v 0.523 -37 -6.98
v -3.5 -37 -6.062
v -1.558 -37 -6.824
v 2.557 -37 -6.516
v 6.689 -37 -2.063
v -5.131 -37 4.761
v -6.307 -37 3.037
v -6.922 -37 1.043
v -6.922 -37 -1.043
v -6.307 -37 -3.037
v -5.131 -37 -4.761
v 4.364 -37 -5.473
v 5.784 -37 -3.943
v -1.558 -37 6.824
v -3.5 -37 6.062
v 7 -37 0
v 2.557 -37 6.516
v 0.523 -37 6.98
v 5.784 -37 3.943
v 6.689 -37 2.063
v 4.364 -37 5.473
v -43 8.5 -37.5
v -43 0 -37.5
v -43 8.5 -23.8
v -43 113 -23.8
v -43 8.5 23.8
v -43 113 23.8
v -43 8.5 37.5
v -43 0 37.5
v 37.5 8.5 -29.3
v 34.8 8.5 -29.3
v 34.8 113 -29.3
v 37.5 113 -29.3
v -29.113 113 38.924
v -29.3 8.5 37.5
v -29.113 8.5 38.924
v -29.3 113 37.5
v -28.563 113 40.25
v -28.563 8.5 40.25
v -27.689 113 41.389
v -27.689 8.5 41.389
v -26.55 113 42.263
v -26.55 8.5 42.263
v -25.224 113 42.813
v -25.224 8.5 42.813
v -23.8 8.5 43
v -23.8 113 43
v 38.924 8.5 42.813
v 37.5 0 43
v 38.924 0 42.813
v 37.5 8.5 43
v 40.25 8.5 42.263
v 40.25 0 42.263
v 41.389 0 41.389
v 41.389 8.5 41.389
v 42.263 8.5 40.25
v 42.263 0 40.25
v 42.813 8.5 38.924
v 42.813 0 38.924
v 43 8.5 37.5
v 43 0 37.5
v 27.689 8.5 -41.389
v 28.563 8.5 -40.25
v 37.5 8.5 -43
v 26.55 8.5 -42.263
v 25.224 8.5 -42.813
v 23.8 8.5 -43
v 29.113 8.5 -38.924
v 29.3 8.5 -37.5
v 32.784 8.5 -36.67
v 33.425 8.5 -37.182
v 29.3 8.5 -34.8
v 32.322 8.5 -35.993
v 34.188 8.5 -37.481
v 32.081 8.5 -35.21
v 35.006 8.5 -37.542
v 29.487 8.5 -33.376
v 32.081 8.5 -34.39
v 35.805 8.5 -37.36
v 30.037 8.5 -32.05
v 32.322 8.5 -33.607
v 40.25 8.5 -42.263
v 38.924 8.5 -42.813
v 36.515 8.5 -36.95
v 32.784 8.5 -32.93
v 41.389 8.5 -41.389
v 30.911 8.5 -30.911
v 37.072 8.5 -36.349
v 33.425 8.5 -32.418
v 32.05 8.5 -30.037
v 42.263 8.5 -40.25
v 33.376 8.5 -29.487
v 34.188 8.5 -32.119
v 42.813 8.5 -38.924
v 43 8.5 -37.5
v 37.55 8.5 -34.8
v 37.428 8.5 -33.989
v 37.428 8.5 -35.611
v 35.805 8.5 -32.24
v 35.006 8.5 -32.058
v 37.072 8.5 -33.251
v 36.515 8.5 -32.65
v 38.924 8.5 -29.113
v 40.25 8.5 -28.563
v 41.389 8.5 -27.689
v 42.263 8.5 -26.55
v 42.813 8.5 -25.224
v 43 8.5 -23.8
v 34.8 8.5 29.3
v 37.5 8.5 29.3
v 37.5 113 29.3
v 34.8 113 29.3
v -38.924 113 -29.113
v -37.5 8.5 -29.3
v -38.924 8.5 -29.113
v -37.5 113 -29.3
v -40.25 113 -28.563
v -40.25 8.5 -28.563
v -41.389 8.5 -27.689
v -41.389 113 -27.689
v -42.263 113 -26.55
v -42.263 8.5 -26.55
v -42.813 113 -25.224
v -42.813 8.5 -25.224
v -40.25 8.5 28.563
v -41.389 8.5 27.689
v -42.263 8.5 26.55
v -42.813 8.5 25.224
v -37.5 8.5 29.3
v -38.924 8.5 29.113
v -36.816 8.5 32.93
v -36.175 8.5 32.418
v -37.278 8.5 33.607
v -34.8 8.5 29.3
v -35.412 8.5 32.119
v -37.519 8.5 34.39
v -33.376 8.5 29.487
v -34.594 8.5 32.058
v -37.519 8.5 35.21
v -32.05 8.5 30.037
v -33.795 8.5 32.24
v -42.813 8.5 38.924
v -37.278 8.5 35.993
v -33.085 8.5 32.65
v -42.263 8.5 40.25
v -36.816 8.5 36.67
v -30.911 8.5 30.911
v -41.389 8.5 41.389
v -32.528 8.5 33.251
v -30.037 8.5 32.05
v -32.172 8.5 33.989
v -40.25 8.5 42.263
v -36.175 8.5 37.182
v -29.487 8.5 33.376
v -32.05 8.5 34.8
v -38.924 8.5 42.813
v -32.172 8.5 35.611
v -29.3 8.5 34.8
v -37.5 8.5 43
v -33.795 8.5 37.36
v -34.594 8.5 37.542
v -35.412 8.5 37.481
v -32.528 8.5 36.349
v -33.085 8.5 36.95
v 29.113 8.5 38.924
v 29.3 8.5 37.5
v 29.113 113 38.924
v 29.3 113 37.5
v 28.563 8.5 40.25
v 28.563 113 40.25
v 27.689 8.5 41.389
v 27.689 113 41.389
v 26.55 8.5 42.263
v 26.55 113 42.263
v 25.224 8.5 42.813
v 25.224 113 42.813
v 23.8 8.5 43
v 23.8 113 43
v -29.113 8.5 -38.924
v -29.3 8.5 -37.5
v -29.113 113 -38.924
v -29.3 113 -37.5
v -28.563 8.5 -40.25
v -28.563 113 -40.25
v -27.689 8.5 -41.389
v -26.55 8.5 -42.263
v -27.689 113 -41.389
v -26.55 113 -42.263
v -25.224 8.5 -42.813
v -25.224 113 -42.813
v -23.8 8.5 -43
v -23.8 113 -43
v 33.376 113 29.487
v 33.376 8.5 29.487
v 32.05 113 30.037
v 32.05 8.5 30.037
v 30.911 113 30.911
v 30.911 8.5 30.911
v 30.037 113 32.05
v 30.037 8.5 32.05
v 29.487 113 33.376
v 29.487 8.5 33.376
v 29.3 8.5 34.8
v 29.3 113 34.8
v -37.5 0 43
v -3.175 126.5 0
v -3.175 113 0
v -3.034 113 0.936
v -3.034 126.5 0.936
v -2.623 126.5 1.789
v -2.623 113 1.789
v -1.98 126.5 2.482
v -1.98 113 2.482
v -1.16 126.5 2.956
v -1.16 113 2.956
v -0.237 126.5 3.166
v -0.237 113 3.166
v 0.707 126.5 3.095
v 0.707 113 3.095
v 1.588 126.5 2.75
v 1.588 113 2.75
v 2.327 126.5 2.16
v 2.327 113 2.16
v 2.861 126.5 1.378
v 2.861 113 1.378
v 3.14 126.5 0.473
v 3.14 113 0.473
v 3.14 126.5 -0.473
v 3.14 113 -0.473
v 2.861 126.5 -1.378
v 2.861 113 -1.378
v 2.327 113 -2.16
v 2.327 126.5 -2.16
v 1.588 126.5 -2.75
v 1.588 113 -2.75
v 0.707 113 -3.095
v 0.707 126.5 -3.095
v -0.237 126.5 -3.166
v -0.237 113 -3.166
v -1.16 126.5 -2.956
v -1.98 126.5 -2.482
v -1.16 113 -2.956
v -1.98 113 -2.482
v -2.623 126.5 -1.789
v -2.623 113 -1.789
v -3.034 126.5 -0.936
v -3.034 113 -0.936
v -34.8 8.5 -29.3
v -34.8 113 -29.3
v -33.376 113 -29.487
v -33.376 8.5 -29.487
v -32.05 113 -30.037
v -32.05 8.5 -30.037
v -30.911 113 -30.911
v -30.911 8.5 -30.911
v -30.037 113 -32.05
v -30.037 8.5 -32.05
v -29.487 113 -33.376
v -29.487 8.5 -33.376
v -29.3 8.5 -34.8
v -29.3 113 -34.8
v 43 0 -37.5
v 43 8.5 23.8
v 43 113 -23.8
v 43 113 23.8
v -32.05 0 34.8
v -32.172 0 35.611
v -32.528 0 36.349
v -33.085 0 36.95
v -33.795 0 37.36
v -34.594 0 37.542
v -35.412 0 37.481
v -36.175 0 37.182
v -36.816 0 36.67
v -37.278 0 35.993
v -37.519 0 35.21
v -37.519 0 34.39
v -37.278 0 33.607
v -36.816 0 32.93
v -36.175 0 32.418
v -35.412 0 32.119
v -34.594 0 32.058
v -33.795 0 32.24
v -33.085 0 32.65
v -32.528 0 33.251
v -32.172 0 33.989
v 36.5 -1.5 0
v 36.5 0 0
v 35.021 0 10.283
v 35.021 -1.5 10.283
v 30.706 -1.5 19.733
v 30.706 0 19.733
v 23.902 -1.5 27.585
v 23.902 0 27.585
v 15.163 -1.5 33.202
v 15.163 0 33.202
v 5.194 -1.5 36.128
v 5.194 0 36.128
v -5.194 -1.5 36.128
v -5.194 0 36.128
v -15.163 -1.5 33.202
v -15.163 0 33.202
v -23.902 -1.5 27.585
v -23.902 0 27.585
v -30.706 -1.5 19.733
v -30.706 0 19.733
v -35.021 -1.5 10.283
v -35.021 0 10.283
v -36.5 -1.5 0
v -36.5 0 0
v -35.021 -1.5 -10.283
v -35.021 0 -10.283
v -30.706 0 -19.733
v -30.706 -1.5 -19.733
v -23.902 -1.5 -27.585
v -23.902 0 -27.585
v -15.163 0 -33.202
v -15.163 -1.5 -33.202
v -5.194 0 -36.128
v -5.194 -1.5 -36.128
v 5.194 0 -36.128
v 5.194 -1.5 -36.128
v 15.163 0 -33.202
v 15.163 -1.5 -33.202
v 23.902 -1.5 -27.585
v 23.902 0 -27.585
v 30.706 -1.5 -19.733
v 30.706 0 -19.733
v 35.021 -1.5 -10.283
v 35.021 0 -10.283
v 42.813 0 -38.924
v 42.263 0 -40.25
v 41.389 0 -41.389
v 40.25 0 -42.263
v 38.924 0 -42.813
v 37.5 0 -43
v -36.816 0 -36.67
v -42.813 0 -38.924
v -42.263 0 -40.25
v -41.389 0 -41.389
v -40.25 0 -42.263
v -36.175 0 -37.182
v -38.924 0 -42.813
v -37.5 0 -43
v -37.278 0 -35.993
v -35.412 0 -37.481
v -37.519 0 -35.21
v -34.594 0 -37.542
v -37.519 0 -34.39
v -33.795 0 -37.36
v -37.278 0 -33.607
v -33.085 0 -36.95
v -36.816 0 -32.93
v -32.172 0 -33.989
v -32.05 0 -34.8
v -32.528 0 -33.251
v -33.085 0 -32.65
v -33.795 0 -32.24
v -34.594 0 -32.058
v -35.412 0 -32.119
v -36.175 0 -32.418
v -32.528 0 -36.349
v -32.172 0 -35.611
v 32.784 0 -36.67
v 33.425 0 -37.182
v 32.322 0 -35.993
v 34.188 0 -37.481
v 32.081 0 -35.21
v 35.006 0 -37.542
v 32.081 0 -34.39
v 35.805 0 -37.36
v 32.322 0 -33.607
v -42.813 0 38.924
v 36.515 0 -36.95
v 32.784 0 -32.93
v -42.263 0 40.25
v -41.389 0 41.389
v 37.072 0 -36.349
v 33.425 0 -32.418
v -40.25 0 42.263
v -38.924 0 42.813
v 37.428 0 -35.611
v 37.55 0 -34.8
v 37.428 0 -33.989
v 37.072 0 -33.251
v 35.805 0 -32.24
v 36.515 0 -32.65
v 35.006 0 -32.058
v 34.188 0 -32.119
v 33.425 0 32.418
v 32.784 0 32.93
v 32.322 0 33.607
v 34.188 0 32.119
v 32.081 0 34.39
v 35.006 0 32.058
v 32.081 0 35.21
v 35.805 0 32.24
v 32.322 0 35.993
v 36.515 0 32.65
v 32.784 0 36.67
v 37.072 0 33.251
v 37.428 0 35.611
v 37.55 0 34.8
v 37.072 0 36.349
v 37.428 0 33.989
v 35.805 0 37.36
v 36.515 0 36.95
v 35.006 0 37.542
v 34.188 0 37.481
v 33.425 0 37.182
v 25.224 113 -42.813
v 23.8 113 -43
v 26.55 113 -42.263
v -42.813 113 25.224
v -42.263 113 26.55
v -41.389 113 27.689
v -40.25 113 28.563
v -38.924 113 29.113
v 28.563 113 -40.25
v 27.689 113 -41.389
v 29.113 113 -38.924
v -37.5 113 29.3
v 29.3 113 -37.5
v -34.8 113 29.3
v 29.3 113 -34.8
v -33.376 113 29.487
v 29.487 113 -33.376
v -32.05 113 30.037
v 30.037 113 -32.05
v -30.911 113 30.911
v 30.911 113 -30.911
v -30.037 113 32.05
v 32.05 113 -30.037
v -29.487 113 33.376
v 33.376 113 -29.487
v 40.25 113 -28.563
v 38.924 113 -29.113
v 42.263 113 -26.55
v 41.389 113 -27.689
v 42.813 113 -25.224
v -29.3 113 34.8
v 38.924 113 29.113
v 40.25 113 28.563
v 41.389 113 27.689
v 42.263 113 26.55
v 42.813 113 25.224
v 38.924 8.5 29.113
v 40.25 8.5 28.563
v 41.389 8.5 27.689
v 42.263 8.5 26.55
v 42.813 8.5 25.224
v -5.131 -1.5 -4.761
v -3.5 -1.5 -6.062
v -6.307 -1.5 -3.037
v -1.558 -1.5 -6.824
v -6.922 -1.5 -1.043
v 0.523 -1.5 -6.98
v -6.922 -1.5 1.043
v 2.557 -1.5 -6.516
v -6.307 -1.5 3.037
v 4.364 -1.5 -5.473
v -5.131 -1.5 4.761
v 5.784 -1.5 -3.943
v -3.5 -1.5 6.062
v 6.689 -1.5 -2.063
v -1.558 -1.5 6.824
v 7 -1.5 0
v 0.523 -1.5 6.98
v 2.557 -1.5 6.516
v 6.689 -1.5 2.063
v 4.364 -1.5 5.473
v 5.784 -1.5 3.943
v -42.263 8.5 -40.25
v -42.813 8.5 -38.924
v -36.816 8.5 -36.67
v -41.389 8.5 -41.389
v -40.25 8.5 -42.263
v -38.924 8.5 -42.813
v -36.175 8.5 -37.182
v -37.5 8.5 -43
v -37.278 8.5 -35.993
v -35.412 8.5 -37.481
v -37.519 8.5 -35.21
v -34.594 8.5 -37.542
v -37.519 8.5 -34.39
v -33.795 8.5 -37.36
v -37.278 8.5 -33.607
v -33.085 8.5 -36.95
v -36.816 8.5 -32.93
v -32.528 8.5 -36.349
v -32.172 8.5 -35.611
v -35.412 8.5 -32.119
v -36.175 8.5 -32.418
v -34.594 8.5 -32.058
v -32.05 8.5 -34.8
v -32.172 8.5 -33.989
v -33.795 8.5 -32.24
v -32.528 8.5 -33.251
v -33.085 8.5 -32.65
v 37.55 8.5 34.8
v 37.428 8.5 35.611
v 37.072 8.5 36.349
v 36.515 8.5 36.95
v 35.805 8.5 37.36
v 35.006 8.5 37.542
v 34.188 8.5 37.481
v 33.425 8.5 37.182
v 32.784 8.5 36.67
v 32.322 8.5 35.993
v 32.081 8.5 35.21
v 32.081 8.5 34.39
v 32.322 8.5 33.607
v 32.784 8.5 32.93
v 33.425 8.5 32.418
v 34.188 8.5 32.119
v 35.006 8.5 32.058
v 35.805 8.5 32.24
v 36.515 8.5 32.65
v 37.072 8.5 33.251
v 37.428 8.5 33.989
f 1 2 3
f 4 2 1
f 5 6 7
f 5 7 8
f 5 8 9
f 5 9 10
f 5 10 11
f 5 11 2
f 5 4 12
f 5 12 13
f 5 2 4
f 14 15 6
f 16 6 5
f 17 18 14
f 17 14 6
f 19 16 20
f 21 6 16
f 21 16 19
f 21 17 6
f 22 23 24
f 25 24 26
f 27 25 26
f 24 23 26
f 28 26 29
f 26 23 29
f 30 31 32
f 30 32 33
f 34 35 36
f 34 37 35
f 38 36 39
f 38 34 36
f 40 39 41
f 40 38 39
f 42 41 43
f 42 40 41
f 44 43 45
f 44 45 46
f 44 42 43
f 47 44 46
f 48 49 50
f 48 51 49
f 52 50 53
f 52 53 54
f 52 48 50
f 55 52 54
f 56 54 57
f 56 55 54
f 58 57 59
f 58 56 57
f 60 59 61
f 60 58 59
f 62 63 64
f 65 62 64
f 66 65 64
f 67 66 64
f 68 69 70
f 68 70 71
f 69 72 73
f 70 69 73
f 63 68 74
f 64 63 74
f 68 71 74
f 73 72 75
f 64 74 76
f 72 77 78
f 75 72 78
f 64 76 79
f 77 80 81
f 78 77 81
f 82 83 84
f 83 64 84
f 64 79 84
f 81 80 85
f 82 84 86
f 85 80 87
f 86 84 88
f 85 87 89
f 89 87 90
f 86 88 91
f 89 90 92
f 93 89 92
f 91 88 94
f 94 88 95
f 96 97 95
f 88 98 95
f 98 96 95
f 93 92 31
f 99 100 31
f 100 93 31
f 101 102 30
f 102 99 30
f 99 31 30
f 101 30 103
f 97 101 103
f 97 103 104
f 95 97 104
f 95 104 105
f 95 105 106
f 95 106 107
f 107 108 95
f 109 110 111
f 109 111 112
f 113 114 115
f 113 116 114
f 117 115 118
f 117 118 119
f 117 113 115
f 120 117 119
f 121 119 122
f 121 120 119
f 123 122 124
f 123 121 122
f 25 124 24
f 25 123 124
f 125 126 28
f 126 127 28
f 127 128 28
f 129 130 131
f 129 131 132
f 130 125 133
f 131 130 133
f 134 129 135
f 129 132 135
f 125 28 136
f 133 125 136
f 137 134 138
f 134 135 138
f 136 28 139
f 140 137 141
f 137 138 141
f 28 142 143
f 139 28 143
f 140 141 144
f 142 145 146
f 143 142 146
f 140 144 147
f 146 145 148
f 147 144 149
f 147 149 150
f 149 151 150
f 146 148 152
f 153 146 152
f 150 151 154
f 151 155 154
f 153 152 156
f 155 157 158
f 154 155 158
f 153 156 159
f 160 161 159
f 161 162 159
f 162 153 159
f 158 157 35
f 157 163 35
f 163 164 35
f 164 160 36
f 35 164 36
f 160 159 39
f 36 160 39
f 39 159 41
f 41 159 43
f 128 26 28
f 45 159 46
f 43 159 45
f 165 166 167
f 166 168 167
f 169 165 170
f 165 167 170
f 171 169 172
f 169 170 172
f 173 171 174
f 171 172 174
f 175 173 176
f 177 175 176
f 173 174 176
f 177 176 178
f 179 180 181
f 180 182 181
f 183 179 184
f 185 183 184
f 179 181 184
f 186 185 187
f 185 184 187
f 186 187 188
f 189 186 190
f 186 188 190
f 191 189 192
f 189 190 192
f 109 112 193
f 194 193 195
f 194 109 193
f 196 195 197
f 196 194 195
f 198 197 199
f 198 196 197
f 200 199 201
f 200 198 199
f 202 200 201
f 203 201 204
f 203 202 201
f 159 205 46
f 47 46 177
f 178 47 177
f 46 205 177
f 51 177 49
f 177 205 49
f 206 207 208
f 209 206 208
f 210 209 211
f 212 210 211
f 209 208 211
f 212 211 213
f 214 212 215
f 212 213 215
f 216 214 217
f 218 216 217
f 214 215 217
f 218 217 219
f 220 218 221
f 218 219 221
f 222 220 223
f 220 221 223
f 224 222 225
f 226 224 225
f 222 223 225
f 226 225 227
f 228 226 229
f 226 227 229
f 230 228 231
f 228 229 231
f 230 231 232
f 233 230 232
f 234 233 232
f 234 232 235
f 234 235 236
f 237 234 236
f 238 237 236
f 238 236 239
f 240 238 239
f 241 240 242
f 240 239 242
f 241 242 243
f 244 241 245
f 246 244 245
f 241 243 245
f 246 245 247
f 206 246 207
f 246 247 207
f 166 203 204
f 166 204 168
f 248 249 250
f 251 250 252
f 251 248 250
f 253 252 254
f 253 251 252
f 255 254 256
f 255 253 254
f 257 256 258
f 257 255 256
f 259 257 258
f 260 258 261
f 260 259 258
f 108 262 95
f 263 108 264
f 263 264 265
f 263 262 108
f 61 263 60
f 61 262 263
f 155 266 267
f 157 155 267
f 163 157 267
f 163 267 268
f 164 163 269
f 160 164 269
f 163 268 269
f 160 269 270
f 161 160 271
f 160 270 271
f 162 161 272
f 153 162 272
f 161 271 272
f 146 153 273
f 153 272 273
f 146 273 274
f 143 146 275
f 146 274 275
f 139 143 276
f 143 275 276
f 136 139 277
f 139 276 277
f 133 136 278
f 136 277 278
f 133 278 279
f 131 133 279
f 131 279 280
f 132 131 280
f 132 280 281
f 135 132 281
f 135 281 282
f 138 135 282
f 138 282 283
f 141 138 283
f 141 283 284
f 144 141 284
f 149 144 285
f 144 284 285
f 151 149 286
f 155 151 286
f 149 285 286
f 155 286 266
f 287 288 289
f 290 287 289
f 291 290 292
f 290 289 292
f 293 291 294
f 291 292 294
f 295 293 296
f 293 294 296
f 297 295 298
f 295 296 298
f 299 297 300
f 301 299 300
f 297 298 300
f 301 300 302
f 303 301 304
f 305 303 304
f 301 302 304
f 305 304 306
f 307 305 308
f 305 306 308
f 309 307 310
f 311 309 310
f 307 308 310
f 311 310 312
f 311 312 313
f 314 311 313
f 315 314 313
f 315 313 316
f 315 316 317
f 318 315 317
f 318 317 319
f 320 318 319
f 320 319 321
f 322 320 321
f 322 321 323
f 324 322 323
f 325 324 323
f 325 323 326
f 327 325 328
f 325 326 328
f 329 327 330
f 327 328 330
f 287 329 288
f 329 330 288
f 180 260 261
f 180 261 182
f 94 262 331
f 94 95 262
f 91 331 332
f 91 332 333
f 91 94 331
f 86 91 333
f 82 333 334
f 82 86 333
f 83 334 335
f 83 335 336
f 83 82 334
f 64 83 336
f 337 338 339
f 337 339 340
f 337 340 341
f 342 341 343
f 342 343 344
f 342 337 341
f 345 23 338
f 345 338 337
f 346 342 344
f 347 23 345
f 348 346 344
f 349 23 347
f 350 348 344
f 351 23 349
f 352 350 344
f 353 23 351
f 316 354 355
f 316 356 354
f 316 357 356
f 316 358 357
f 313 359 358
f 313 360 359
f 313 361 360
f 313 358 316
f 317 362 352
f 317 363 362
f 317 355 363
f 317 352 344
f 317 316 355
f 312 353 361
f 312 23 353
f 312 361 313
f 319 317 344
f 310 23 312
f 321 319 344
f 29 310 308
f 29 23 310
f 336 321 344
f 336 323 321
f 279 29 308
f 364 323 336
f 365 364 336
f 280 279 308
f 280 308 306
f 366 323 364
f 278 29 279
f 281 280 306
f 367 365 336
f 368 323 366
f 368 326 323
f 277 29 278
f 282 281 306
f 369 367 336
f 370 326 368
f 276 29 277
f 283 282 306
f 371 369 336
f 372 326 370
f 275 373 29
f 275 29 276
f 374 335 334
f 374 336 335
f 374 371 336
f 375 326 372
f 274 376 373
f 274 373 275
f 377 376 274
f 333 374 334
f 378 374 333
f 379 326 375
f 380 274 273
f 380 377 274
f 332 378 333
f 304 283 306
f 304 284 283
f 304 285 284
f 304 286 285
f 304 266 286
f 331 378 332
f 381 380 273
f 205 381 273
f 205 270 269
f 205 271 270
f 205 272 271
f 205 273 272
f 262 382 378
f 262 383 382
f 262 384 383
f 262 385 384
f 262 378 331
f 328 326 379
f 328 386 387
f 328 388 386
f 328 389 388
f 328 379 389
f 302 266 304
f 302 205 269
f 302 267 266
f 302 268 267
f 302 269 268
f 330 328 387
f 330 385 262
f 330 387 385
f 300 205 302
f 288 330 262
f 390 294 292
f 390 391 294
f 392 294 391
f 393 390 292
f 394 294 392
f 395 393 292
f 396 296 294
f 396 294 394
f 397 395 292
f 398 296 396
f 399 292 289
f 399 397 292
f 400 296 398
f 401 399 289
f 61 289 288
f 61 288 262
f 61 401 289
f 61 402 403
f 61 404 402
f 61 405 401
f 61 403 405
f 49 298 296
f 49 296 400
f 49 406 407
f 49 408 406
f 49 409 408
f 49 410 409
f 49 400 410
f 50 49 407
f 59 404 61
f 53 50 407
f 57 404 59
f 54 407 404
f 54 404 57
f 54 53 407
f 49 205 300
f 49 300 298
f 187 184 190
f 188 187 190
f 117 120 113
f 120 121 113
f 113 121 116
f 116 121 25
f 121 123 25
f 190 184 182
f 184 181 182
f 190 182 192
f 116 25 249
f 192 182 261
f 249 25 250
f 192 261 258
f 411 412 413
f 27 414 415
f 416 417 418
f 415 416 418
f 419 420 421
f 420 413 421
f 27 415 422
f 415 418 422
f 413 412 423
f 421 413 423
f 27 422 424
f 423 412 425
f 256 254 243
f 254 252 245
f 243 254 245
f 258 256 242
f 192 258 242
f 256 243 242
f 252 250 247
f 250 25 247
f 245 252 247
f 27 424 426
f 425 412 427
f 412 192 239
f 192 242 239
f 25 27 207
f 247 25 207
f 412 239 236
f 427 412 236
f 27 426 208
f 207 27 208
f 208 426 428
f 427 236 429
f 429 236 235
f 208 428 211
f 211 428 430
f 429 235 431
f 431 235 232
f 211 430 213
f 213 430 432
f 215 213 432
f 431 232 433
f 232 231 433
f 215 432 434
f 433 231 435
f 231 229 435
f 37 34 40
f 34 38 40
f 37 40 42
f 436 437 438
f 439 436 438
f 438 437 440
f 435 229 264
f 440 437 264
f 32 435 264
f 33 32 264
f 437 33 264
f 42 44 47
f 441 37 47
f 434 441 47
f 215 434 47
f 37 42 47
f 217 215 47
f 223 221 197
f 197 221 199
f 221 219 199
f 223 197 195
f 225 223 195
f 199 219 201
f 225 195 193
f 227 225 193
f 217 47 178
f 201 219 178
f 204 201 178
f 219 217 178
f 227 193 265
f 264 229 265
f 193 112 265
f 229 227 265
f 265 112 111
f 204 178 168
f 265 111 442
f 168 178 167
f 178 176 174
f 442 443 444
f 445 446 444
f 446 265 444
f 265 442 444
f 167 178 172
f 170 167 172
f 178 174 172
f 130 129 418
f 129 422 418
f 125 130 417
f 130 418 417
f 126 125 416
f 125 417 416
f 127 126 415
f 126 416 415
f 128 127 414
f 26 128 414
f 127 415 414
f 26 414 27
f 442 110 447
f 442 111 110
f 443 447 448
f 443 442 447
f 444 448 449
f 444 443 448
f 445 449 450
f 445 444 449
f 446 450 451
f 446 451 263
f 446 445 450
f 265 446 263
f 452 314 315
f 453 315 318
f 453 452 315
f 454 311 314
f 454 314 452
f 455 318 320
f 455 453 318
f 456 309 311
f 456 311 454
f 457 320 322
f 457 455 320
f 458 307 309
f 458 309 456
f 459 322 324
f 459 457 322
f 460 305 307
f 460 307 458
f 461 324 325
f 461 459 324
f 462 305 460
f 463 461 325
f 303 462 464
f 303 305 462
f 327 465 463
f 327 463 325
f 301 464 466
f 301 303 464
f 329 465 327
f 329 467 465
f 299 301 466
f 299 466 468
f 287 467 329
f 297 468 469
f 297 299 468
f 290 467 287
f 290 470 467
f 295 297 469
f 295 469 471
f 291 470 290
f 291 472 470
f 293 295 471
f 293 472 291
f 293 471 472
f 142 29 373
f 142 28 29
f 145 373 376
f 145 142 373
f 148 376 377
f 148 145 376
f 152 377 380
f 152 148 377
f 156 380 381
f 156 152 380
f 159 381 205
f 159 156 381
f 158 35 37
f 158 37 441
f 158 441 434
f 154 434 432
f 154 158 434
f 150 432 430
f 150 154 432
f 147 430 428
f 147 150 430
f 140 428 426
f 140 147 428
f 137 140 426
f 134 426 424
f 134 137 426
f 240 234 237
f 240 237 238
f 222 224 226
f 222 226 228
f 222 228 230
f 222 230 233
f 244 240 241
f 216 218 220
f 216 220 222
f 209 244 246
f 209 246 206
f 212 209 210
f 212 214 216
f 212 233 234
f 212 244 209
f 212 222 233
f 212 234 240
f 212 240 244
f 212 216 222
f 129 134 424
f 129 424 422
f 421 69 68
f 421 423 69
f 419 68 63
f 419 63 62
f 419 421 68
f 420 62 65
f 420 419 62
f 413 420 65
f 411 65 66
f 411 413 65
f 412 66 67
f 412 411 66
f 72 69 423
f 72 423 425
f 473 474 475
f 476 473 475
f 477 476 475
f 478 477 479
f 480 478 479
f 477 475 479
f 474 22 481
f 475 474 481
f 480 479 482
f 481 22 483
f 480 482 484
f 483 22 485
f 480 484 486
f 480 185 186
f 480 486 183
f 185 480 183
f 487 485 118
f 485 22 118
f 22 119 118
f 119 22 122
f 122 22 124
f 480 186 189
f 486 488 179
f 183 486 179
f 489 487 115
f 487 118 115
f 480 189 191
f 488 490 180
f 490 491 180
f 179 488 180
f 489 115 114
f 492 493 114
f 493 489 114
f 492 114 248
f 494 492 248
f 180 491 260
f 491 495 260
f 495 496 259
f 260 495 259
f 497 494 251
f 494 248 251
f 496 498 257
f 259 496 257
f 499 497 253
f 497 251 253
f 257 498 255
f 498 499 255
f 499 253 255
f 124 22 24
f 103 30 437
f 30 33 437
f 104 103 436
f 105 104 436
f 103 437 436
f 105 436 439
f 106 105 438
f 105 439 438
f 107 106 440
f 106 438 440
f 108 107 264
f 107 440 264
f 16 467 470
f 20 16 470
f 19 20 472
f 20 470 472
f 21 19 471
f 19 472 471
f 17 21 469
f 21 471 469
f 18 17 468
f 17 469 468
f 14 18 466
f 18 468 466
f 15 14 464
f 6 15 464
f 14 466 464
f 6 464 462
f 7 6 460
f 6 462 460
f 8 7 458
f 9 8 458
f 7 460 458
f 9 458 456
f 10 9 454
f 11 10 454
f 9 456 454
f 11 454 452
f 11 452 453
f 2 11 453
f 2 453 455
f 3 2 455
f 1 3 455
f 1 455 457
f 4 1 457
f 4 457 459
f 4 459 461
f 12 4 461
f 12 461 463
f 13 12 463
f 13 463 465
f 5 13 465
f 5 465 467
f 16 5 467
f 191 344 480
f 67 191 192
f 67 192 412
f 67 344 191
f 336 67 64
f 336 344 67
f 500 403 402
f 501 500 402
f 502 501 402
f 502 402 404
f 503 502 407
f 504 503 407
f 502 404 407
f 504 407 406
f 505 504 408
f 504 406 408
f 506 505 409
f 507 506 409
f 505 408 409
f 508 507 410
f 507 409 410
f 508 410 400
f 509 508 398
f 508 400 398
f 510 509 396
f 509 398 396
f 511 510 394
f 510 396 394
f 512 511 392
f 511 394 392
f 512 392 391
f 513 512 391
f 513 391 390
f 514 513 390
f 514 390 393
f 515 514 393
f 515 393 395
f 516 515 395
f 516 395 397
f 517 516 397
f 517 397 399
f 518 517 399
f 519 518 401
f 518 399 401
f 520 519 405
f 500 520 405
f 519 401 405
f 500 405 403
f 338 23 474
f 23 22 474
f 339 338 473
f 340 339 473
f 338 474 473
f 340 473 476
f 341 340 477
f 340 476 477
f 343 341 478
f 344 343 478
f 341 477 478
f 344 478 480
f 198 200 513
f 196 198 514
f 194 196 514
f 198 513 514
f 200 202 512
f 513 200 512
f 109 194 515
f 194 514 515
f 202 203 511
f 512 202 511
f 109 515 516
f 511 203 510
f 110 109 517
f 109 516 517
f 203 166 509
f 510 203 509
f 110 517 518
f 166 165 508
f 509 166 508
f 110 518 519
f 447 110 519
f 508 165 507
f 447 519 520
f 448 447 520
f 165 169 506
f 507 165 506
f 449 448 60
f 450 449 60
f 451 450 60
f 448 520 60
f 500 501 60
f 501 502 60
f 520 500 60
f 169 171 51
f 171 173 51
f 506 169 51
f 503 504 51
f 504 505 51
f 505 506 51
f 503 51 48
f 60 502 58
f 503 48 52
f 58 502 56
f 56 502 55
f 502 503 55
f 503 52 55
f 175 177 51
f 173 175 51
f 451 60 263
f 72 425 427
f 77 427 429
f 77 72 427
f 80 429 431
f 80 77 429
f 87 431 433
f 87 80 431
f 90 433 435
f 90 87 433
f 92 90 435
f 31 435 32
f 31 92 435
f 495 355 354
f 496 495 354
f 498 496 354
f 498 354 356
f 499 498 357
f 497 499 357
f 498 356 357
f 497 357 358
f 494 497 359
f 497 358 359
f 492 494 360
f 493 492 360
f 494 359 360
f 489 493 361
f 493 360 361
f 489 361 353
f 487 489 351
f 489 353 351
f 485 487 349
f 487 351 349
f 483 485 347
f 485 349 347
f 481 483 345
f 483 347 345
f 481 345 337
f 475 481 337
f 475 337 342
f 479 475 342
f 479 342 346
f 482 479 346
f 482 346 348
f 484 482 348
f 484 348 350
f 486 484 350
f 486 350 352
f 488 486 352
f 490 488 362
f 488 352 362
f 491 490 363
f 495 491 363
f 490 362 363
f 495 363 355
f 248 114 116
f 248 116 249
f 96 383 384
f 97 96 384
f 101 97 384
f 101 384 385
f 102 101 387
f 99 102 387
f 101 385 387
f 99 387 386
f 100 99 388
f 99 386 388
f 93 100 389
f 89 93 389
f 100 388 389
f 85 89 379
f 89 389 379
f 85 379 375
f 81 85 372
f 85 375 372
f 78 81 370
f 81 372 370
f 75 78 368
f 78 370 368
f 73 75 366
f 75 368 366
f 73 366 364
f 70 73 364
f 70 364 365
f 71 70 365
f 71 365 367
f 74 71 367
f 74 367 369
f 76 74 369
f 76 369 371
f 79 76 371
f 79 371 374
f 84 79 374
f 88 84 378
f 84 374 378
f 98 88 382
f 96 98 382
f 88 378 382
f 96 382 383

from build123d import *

# Parameters (mm, degrees)
F1_W      = 86
F1_H      = 86
F1_R      = 2.75
F2_DEPTH  = 8.5
F3_R      = 36.5
F4_DEPTH  = 1.5
F5_R      = 7
F6_DEPTH  = 37
F8_DEPTH  = 113
F9_R      = 5.5
F10_R     = 3.175
F11_DEPTH = 13.5


with BuildPart() as f2:
    # F1 (on Front) → F2 (new body)
    with BuildSketch(Plane.XZ):
        Rectangle(F1_W, F1_H)
        with Locations((-34.8, -34.8)):
            Circle(F1_R, mode=Mode.SUBTRACT)
        with Locations((34.8, -34.8)):
            Circle(F1_R, mode=Mode.SUBTRACT)
        with Locations((-34.8, 34.8)):
            Circle(F1_R, mode=Mode.SUBTRACT)
        with Locations((34.8, 34.8)):
            Circle(F1_R, mode=Mode.SUBTRACT)
    extrude(amount=-F2_DEPTH)

    # F3 (on Front) → F4 (join)
    with BuildSketch(Plane.XZ):
        Circle(F3_R)
    extrude(amount=F4_DEPTH)

    # F5 (on Front) → F6 (join)
    with BuildSketch(Plane.XZ):
        Circle(F5_R)
    extrude(amount=F6_DEPTH)

    # F7 (on Front) → F8 (join)
    with BuildSketch(Plane.XZ):
        with BuildLine():
            ThreePointArc((34.8, 29.3), (30.9109127035, 30.9109127035), (29.3, 34.8))
            Line((29.3, 34.8), (29.3, 43))
            Line((29.3, 43), (-29.3, 43))
            Line((-29.3, 43), (-29.3, 34.8))
            ThreePointArc((-29.3, 34.8), (-30.9109127035, 30.9109127035), (-34.8, 29.3))
            Line((-34.8, 29.3), (-43, 29.3))
            Line((-43, 29.3), (-43, -29.3))
            Line((-43, -29.3), (-34.8, -29.3))
            ThreePointArc((-34.8, -29.3), (-30.9109127035, -30.9109127035), (-29.3, -34.8))
            Line((-29.3, -34.8), (-29.3, -43))
            Line((-29.3, -43), (29.3, -43))
            Line((29.3, -43), (29.3, -34.8))
            ThreePointArc((29.3, -34.8), (30.9109127035, -30.9109127035), (34.8, -29.3))
            Line((34.8, -29.3), (43, -29.3))
            Line((43, -29.3), (43, 29.3))
            Line((43, 29.3), (34.8, 29.3))
        make_face()
    extrude(amount=-F8_DEPTH)

    # F9
    f9_edges = [f2.edges().sort_by_distance(p)[0] for p in [
        (29.3, 60.75, 43),
        (43, 60.75, 29.3),
        (43, 4.25, 43),
        (-29.3, 60.75, 43),
        (-43, 60.75, 29.3),
        (-43, 4.25, 43),
        (43, 60.75, -29.3),
        (29.3, 60.75, -43),
        (-43, 4.25, -43),
        (-29.3, 60.75, -43),
        (-43, 60.75, -29.3),
        (43, 4.25, -43),
    ]]
    fillet(f9_edges, radius=F9_R)

    # F10 (on face) → F11 (join)
    with BuildSketch(Plane(origin=(0, 113, 0), x_dir=(-1, 0, 0), z_dir=(0, 1, 0))):
        Circle(F10_R)
    extrude(amount=F11_DEPTH)


solid = f2.part
